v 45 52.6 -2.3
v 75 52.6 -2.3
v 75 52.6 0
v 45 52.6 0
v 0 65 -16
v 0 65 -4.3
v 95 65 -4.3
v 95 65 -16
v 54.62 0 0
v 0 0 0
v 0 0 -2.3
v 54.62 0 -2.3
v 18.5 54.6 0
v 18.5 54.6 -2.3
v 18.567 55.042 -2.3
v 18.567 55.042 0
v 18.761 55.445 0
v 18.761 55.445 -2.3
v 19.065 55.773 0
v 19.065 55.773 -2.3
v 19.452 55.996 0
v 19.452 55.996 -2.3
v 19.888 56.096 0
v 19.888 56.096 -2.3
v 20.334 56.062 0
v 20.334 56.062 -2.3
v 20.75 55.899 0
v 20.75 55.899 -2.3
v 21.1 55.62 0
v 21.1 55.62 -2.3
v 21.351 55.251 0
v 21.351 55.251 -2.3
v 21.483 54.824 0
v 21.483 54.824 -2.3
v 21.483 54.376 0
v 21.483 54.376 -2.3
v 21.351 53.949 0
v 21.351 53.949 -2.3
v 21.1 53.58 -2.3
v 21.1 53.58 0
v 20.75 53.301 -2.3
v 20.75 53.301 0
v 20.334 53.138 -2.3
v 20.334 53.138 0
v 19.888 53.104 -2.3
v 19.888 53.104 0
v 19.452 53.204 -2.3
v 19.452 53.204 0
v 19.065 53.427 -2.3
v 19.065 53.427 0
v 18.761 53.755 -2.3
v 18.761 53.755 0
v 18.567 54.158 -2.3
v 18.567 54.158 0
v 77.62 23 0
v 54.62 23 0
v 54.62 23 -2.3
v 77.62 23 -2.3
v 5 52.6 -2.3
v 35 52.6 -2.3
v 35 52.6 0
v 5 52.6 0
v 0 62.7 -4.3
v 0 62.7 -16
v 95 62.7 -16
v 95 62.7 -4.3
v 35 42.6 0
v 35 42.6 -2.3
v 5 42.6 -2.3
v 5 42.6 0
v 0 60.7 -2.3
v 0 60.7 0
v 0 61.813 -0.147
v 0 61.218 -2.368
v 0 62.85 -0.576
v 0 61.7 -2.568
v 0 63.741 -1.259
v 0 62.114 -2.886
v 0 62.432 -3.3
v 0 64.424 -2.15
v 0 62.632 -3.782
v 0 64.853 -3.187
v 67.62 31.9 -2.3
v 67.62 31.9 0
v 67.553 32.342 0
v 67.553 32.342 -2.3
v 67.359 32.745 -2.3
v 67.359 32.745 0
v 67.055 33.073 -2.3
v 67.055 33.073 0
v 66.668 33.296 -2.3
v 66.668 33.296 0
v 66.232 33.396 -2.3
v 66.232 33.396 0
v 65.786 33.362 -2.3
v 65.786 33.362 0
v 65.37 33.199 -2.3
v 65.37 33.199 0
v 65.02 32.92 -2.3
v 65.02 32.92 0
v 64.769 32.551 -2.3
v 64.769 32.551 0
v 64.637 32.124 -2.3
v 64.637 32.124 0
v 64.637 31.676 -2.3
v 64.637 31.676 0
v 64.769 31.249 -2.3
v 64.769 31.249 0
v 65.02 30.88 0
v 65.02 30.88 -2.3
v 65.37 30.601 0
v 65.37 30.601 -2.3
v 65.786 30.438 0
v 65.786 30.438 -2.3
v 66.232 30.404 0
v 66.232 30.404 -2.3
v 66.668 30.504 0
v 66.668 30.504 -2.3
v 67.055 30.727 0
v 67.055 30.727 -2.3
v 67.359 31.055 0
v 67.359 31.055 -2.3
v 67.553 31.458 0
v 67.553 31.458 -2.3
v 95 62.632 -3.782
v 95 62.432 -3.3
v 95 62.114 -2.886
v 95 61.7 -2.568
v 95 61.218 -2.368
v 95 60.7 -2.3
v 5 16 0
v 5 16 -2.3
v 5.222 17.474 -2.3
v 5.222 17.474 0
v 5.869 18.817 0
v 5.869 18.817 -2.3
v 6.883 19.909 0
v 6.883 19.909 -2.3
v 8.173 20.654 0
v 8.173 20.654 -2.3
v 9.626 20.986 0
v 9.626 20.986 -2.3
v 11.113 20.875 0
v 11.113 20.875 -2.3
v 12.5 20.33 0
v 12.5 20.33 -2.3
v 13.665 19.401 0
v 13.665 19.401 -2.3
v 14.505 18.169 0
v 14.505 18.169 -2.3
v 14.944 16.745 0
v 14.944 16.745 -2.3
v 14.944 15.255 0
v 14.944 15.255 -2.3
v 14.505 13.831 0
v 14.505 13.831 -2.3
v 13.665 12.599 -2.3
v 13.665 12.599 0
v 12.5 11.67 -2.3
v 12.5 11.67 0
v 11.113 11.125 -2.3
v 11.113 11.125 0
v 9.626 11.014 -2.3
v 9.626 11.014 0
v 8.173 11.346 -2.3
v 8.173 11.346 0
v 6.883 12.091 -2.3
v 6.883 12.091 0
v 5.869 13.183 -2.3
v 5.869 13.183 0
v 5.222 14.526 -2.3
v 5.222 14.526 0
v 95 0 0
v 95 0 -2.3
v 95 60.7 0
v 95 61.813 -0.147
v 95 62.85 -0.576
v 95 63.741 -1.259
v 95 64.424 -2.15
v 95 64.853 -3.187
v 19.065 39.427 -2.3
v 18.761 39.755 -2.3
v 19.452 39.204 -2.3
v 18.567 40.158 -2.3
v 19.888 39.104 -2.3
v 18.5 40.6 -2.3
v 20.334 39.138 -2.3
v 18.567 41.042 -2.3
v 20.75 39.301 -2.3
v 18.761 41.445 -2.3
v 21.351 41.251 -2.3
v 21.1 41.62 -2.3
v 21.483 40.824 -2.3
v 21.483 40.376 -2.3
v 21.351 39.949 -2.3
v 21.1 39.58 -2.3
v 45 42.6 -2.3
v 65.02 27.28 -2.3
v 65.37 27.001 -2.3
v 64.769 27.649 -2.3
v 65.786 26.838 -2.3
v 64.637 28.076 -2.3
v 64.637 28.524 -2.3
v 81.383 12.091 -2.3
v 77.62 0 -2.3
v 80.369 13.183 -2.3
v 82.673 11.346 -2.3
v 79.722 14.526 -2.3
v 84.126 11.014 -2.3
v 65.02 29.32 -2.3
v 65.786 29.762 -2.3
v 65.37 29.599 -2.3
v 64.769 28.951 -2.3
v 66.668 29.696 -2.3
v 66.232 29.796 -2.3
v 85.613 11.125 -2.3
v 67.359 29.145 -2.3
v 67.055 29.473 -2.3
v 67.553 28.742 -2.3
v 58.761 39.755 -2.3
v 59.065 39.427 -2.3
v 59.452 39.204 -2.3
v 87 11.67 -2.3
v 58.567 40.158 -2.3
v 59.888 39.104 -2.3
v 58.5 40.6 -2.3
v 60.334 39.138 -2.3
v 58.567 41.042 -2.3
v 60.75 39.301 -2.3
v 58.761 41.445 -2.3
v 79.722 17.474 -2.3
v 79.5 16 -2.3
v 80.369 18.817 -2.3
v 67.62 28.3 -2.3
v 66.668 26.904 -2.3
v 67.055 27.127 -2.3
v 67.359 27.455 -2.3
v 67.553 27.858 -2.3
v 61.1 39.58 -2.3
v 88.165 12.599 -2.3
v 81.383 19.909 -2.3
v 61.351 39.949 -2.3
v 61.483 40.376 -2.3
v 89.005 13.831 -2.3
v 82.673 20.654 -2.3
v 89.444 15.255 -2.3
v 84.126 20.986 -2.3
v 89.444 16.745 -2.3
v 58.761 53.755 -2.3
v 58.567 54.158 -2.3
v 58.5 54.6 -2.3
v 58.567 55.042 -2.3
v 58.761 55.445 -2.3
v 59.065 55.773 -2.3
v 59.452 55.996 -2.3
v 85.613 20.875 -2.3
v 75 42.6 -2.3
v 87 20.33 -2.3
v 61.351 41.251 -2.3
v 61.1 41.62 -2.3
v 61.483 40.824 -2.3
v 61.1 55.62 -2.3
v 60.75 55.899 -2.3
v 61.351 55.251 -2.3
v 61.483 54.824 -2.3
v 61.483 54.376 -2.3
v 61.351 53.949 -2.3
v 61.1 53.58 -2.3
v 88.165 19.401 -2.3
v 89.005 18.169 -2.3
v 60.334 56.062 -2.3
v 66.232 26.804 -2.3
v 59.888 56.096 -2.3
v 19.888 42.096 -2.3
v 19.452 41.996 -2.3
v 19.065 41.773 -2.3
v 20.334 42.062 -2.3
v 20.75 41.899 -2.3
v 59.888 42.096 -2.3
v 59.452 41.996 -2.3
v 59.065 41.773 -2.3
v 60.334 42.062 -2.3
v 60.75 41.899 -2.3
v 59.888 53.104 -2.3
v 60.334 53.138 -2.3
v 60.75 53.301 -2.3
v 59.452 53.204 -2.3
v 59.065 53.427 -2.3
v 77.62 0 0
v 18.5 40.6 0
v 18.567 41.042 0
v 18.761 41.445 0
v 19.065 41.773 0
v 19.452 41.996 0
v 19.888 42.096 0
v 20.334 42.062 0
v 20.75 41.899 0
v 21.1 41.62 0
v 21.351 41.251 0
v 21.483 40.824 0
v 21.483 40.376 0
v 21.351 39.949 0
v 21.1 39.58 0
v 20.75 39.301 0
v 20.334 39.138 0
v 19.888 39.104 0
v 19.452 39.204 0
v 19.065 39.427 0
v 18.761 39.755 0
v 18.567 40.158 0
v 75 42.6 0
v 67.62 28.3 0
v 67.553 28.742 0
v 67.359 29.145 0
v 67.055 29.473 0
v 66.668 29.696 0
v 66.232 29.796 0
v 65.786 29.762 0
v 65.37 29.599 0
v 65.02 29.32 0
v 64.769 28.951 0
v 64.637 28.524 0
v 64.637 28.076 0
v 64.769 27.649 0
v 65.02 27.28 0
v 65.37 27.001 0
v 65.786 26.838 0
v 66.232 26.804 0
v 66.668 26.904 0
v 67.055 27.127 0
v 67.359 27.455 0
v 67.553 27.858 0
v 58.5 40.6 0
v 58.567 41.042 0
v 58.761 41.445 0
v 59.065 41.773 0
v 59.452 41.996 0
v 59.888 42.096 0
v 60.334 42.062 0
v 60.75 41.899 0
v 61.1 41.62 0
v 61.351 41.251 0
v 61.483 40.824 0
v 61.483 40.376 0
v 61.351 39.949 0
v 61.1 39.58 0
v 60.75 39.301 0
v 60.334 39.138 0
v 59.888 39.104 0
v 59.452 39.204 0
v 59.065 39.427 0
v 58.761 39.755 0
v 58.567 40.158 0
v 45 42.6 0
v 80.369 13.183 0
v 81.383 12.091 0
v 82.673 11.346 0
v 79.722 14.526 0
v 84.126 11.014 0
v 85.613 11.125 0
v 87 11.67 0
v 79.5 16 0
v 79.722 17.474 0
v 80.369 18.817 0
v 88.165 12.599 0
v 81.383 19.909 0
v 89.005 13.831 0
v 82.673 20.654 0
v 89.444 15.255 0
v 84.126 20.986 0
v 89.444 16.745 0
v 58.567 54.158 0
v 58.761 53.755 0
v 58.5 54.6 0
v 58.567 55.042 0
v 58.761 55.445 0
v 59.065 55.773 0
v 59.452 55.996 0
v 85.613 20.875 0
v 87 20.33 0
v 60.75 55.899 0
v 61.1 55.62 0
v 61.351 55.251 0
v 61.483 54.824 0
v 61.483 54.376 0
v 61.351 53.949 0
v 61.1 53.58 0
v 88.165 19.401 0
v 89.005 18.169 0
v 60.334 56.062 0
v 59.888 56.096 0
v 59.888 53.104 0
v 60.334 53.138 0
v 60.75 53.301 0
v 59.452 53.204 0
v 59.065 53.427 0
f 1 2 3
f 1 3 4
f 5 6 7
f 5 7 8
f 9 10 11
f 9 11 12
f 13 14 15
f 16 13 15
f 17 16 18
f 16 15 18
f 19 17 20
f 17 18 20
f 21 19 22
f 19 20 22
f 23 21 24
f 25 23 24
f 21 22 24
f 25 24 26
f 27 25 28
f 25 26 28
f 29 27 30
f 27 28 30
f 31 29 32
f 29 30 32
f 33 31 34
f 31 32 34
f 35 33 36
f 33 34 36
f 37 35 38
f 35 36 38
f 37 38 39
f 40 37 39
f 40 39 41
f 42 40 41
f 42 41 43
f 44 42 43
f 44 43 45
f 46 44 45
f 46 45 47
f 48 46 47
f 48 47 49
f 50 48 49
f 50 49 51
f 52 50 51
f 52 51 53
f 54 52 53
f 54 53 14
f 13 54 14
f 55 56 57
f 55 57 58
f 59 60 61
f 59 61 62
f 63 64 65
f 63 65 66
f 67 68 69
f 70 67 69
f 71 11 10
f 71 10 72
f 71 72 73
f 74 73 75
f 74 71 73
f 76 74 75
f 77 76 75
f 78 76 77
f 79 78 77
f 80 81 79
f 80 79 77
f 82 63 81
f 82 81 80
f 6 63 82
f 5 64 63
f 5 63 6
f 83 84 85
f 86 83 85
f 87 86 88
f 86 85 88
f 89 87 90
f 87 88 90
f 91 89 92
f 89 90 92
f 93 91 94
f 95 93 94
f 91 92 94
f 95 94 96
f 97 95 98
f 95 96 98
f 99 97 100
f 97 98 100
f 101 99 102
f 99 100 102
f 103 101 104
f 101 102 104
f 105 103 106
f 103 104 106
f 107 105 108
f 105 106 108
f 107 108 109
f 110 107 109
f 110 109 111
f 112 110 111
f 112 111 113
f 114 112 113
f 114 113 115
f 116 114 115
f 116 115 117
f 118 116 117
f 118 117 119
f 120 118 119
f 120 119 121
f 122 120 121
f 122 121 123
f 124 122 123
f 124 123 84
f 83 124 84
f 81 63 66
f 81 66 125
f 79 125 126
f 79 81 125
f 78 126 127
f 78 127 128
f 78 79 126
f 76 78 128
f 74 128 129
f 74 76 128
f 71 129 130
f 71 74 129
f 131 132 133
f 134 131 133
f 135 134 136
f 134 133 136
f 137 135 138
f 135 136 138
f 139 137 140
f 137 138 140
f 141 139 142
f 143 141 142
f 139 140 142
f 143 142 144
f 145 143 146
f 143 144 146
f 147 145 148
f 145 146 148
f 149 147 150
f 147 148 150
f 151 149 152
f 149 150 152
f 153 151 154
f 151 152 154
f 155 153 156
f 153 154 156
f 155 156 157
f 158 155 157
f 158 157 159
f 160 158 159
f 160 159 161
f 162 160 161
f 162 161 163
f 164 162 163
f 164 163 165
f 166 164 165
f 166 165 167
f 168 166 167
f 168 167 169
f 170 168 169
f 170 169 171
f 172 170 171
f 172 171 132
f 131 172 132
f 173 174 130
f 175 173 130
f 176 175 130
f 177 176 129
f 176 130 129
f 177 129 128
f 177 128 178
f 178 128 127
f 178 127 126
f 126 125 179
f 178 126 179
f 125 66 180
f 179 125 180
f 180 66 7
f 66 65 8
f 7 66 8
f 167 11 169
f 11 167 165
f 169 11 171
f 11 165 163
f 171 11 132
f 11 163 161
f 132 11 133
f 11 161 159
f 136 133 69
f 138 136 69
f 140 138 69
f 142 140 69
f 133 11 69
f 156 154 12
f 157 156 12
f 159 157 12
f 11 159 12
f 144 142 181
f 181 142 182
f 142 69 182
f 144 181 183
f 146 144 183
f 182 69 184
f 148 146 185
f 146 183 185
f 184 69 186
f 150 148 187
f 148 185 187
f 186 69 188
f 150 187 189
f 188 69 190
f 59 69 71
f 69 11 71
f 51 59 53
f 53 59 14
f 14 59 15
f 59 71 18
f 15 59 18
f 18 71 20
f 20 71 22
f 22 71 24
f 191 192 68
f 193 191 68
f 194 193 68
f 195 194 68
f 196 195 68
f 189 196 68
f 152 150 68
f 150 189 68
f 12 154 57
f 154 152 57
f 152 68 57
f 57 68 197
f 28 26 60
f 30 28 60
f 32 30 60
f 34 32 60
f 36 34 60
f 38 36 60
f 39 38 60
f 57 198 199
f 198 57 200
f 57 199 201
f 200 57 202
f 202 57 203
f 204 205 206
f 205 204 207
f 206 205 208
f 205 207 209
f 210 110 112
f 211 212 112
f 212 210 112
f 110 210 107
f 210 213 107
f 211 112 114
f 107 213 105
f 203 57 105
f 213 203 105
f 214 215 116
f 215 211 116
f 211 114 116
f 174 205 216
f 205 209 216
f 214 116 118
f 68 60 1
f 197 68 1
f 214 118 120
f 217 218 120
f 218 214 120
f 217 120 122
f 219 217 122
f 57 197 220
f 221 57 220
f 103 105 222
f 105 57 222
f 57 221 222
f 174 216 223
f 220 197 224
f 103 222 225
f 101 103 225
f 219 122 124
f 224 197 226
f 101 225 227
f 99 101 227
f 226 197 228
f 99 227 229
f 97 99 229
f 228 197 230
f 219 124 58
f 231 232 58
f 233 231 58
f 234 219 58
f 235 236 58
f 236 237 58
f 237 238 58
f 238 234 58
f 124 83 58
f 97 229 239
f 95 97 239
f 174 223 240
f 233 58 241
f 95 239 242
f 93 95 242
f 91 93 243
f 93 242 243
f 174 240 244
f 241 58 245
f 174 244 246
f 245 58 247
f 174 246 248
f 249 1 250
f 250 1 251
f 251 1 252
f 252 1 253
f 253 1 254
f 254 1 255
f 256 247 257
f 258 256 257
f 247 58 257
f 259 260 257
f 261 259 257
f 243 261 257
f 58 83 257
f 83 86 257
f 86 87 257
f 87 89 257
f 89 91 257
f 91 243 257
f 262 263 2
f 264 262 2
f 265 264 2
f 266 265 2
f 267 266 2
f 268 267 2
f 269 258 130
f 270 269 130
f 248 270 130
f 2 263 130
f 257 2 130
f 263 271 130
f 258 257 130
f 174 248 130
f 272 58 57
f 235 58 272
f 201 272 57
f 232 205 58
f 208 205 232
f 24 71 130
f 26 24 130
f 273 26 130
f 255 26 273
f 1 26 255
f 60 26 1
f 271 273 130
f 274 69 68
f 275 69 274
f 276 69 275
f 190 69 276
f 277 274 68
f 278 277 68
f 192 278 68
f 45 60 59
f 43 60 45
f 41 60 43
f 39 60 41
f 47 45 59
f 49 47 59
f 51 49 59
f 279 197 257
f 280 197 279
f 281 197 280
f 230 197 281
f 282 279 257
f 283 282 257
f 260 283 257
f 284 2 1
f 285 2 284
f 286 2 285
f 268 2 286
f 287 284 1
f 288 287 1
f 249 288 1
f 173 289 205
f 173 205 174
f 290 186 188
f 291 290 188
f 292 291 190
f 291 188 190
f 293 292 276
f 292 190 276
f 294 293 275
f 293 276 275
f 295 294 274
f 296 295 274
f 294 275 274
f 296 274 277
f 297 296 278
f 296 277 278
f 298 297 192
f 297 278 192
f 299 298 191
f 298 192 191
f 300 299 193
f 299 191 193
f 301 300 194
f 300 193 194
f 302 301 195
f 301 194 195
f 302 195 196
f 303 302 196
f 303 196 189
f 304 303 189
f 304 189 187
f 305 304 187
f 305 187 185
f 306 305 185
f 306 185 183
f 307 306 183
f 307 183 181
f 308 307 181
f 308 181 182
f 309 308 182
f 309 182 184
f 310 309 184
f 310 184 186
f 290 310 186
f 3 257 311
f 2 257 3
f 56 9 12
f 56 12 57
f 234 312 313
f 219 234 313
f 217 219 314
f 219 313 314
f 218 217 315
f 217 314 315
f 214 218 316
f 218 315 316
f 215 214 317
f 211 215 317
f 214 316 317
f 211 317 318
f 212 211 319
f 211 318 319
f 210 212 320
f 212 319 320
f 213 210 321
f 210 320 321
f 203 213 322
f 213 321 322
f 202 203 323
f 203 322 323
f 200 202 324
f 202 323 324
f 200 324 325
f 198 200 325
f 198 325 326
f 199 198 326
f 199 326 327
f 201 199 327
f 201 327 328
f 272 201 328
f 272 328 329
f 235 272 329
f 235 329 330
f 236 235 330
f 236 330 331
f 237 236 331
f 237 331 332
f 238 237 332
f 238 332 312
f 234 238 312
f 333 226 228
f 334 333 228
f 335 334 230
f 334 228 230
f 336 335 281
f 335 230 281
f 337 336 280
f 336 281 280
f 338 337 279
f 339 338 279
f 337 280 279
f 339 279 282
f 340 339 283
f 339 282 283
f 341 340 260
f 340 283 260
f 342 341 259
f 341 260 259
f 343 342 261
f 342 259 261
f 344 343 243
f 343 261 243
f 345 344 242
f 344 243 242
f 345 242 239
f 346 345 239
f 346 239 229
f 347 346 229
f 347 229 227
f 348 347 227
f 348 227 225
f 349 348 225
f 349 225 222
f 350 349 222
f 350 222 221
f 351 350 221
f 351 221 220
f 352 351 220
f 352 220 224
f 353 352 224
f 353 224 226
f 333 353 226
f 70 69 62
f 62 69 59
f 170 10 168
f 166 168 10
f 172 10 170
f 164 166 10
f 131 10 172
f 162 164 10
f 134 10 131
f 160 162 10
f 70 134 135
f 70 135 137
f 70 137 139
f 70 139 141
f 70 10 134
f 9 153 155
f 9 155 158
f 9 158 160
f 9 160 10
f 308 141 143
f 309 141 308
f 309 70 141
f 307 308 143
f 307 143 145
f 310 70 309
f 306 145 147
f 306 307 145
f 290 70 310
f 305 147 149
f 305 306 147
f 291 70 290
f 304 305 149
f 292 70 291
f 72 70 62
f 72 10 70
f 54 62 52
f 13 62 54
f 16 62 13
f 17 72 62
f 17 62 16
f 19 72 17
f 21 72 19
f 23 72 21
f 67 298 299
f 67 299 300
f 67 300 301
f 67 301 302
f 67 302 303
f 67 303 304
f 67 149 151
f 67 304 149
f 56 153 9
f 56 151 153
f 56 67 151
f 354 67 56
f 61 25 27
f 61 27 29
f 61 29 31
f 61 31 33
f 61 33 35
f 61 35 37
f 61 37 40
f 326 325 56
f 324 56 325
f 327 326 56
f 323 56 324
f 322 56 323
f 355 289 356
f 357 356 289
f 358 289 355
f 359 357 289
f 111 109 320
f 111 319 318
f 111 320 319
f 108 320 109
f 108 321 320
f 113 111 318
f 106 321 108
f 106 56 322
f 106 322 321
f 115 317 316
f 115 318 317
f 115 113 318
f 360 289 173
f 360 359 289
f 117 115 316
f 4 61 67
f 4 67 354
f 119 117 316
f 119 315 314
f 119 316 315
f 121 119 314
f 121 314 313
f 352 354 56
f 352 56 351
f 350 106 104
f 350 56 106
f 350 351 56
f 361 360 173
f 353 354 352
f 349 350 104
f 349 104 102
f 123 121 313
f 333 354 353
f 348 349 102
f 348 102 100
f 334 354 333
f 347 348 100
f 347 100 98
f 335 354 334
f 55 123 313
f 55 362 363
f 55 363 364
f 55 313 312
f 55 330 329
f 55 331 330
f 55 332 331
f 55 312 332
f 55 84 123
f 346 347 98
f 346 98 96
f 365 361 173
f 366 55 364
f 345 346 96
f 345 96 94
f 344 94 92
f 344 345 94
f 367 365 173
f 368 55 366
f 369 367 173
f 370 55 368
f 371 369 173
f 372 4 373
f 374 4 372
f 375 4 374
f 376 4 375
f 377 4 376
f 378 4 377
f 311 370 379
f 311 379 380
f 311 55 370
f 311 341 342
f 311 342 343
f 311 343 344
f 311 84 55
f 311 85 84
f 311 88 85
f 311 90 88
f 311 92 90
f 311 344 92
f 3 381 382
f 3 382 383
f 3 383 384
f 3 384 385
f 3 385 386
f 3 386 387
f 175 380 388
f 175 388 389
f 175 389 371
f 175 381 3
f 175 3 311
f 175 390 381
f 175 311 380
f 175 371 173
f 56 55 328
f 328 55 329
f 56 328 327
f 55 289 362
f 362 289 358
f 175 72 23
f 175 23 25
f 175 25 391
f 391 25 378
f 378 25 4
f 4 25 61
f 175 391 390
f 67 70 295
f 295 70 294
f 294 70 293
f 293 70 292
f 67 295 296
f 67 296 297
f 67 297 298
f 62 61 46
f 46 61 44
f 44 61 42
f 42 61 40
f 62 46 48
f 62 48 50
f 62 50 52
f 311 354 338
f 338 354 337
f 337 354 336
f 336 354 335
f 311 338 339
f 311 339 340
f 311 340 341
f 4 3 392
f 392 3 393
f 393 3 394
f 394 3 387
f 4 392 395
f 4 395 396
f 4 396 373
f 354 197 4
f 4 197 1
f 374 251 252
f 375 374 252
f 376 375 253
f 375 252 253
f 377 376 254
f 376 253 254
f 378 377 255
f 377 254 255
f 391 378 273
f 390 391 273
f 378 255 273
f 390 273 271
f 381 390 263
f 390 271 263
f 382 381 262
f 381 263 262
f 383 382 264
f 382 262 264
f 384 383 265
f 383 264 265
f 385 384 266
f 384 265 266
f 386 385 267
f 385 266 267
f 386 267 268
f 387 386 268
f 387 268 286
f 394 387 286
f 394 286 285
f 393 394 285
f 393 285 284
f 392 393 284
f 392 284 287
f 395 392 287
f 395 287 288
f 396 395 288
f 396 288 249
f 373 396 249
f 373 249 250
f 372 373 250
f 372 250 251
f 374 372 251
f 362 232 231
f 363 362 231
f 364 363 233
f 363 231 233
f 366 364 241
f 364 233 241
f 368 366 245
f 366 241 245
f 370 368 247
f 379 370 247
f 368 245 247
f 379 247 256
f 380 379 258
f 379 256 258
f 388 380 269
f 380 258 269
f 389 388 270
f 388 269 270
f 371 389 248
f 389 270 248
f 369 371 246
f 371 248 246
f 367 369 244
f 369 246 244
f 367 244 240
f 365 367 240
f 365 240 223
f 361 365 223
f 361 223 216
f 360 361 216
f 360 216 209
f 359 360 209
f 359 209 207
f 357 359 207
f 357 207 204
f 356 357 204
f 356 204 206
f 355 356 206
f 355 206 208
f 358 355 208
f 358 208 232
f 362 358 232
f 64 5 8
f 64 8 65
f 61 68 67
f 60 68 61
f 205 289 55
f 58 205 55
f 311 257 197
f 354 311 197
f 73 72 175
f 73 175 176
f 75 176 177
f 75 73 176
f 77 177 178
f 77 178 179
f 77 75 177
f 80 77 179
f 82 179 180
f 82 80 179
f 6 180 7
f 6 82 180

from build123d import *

# Parameters (mm, degrees)
SKETCH1_W                    = 95
SKETCH1_H                    = 65
BASE_FLANGE1_DEPTH           = 2.3
EDGE_FLANGE1_STRIP_W         = 13.2
EDGE_FLANGE1_STRIP_H         = 2.3
EDGE_FLANGE1_STRIP_CUT_DEPTH = 95
EDGE_FLANGE1_DEPTH           = 95
CUT_EXTRUDE1_REACH           = 118.215
SKETCH9_R                    = 1.5
SKETCH9_W                    = 23
SKETCH9_H                    = 23
CUT_EXTRUDE3_REACH           = 117.921
SKETCH10_R                   = 1.5
SKETCH10_W                   = 30
SKETCH10_H                   = 10
CUT_EXTRUDE4_REACH           = 117.921
SKETCH11_R                   = 5


# Sheet-metal steps are written as plain solids
with BuildPart() as part:
    # Sketch1 → Base-Flange1 (new body)
    with BuildSketch(Plane.XY):
        with Locations((47.5, 32.5)):
            Rectangle(SKETCH1_W, SKETCH1_H)
    extrude(amount=-BASE_FLANGE1_DEPTH)

    # Edge-Flange1 strip (across the edge) → Edge-Flange1 strip cut (cut)
    with BuildSketch(Plane(origin=(0, 65, -2.3), x_dir=(0, -1, 0), z_dir=(1, 0, 0))):
        with Locations((-2.3, -1.15)):
            Rectangle(EDGE_FLANGE1_STRIP_W, EDGE_FLANGE1_STRIP_H)
    extrude(amount=EDGE_FLANGE1_STRIP_CUT_DEPTH, mode=Mode.SUBTRACT)

    # Edge-Flange1 section (across the edge) → Edge-Flange1 (add)
    with BuildSketch(Plane(origin=(0, 65, -2.3), x_dir=(0, -1, 0), z_dir=(1, 0, 0))):
        with BuildLine():
            Line((0, 2), (0, 13.7))
            Line((0, 13.7), (2.3, 13.7))
            Line((2.3, 13.7), (2.3, 2))
            ThreePointArc((2.3, 2), (2.885786438, 0.585786438), (4.3, 0))
            Line((4.3, 0), (4.3, -2.3))
            ThreePointArc((4.3, -2.3), (1.259440841, -1.040559159), (0, 2))
        make_face()
    extrude(amount=EDGE_FLANGE1_DEPTH)

    # Sketch9 → Cut-Extrude1 (cut, up to next)
    with BuildSketch(Plane.XY, mode=Mode.PRIVATE) as cut_extrude1_sk1:
        with Locations((66.12, 28.3)):
            Circle(SKETCH9_R)
    cut_extrude1_tool1 = extrude(cut_extrude1_sk1.sketch, amount=-CUT_EXTRUDE1_REACH, mode=Mode.PRIVATE) & part.part
    # Sketch9 → Cut-Extrude1 (cut, up to next)
    with BuildSketch(Plane.XY, mode=Mode.PRIVATE) as cut_extrude1_sk2:
        with Locations((66.12, 31.9)):
            Circle(SKETCH9_R)
    cut_extrude1_tool2 = extrude(cut_extrude1_sk2.sketch, amount=-CUT_EXTRUDE1_REACH, mode=Mode.PRIVATE) & part.part
    # Sketch9 → Cut-Extrude1 (cut, up to next)
    with BuildSketch(Plane.XY, mode=Mode.PRIVATE) as cut_extrude1_sk3:
        with Locations((66.12, 11.5)):
            Rectangle(SKETCH9_W, SKETCH9_H)
    cut_extrude1_tool3 = extrude(cut_extrude1_sk3.sketch, amount=-CUT_EXTRUDE1_REACH, mode=Mode.PRIVATE) & part.part
    add(cut_extrude1_tool1.solids().sort_by_distance((66.12, 28.3, 0))[0], mode=Mode.SUBTRACT)
    add(cut_extrude1_tool2.solids().sort_by_distance((66.12, 31.9, 0))[0], mode=Mode.SUBTRACT)
    add(cut_extrude1_tool3.solids().sort_by_distance((66.12, 11.5, 0))[0], mode=Mode.SUBTRACT)

    # Sketch10 → Cut-Extrude3 (cut, up to next)
    with BuildSketch(Plane(origin=(0, 0, -2.3), x_dir=(-1, 0, 0), z_dir=(0, 0, -1)), mode=Mode.PRIVATE) as cut_extrude3_sk1:
        with Locations((-60, 54.6)):
            Circle(SKETCH10_R)
    cut_extrude3_tool1 = extrude(cut_extrude3_sk1.sketch, amount=-CUT_EXTRUDE3_REACH, mode=Mode.PRIVATE) & part.part
    # Sketch10 → Cut-Extrude3 (cut, up to next)
    with BuildSketch(Plane(origin=(0, 0, -2.3), x_dir=(-1, 0, 0), z_dir=(0, 0, -1)), mode=Mode.PRIVATE) as cut_extrude3_sk2:
        with Locations((-60, 40.6)):
            Circle(SKETCH10_R)
    cut_extrude3_tool2 = extrude(cut_extrude3_sk2.sketch, amount=-CUT_EXTRUDE3_REACH, mode=Mode.PRIVATE) & part.part
    # Sketch10 → Cut-Extrude3 (cut, up to next)
    with BuildSketch(Plane(origin=(0, 0, -2.3), x_dir=(-1, 0, 0), z_dir=(0, 0, -1)), mode=Mode.PRIVATE) as cut_extrude3_sk3:
        with Locations((-20, 54.6)):
            Circle(SKETCH10_R)
    cut_extrude3_tool3 = extrude(cut_extrude3_sk3.sketch, amount=-CUT_EXTRUDE3_REACH, mode=Mode.PRIVATE) & part.part
    # Sketch10 → Cut-Extrude3 (cut, up to next)
    with BuildSketch(Plane(origin=(0, 0, -2.3), x_dir=(-1, 0, 0), z_dir=(0, 0, -1)), mode=Mode.PRIVATE) as cut_extrude3_sk4:
        with Locations((-20, 40.6)):
            Circle(SKETCH10_R)
    cut_extrude3_tool4 = extrude(cut_extrude3_sk4.sketch, amount=-CUT_EXTRUDE3_REACH, mode=Mode.PRIVATE) & part.part
    # Sketch10 → Cut-Extrude3 (cut, up to next)
    with BuildSketch(Plane(origin=(0, 0, -2.3), x_dir=(-1, 0, 0), z_dir=(0, 0, -1)), mode=Mode.PRIVATE) as cut_extrude3_sk5:
        with Locations((-20, 47.6)):
            Rectangle(SKETCH10_W, SKETCH10_H)
    cut_extrude3_tool5 = extrude(cut_extrude3_sk5.sketch, amount=-CUT_EXTRUDE3_REACH, mode=Mode.PRIVATE) & part.part
    # Sketch10 → Cut-Extrude3 (cut, up to next)
    with BuildSketch(Plane(origin=(0, 0, -2.3), x_dir=(-1, 0, 0), z_dir=(0, 0, -1)), mode=Mode.PRIVATE) as cut_extrude3_sk6:
        with Locations((-60, 47.6)):
            Rectangle(SKETCH10_W, SKETCH10_H)
    cut_extrude3_tool6 = extrude(cut_extrude3_sk6.sketch, amount=-CUT_EXTRUDE3_REACH, mode=Mode.PRIVATE) & part.part
    add(cut_extrude3_tool1.solids().sort_by_distance((60, 54.6, -2.3))[0], mode=Mode.SUBTRACT)
    add(cut_extrude3_tool2.solids().sort_by_distance((60, 40.6, -2.3))[0], mode=Mode.SUBTRACT)
    add(cut_extrude3_tool3.solids().sort_by_distance((20, 54.6, -2.3))[0], mode=Mode.SUBTRACT)
    add(cut_extrude3_tool4.solids().sort_by_distance((20, 40.6, -2.3))[0], mode=Mode.SUBTRACT)
    add(cut_extrude3_tool5.solids().sort_by_distance((20, 47.6, -2.3))[0], mode=Mode.SUBTRACT)
    add(cut_extrude3_tool6.solids().sort_by_distance((60, 47.6, -2.3))[0], mode=Mode.SUBTRACT)

    # Sketch11 → Cut-Extrude4 (cut, up to next)
    with BuildSketch(Plane(origin=(0, 0, -2.3), x_dir=(-1, 0, 0), z_dir=(0, 0, -1)), mode=Mode.PRIVATE) as cut_extrude4_sk1:
        with Locations((-10, 16)):
            Circle(SKETCH11_R)
    cut_extrude4_tool1 = extrude(cut_extrude4_sk1.sketch, amount=-CUT_EXTRUDE4_REACH, mode=Mode.PRIVATE) & part.part
    # Sketch11 → Cut-Extrude4 (cut, up to next)
    with BuildSketch(Plane(origin=(0, 0, -2.3), x_dir=(-1, 0, 0), z_dir=(0, 0, -1)), mode=Mode.PRIVATE) as cut_extrude4_sk2:
        with Locations((-84.5, 16)):
            Circle(SKETCH11_R)
    cut_extrude4_tool2 = extrude(cut_extrude4_sk2.sketch, amount=-CUT_EXTRUDE4_REACH, mode=Mode.PRIVATE) & part.part
    add(cut_extrude4_tool1.solids().sort_by_distance((10, 16, -2.3))[0], mode=Mode.SUBTRACT)
    add(cut_extrude4_tool2.solids().sort_by_distance((84.5, 16, -2.3))[0], mode=Mode.SUBTRACT)


solid = part.part
